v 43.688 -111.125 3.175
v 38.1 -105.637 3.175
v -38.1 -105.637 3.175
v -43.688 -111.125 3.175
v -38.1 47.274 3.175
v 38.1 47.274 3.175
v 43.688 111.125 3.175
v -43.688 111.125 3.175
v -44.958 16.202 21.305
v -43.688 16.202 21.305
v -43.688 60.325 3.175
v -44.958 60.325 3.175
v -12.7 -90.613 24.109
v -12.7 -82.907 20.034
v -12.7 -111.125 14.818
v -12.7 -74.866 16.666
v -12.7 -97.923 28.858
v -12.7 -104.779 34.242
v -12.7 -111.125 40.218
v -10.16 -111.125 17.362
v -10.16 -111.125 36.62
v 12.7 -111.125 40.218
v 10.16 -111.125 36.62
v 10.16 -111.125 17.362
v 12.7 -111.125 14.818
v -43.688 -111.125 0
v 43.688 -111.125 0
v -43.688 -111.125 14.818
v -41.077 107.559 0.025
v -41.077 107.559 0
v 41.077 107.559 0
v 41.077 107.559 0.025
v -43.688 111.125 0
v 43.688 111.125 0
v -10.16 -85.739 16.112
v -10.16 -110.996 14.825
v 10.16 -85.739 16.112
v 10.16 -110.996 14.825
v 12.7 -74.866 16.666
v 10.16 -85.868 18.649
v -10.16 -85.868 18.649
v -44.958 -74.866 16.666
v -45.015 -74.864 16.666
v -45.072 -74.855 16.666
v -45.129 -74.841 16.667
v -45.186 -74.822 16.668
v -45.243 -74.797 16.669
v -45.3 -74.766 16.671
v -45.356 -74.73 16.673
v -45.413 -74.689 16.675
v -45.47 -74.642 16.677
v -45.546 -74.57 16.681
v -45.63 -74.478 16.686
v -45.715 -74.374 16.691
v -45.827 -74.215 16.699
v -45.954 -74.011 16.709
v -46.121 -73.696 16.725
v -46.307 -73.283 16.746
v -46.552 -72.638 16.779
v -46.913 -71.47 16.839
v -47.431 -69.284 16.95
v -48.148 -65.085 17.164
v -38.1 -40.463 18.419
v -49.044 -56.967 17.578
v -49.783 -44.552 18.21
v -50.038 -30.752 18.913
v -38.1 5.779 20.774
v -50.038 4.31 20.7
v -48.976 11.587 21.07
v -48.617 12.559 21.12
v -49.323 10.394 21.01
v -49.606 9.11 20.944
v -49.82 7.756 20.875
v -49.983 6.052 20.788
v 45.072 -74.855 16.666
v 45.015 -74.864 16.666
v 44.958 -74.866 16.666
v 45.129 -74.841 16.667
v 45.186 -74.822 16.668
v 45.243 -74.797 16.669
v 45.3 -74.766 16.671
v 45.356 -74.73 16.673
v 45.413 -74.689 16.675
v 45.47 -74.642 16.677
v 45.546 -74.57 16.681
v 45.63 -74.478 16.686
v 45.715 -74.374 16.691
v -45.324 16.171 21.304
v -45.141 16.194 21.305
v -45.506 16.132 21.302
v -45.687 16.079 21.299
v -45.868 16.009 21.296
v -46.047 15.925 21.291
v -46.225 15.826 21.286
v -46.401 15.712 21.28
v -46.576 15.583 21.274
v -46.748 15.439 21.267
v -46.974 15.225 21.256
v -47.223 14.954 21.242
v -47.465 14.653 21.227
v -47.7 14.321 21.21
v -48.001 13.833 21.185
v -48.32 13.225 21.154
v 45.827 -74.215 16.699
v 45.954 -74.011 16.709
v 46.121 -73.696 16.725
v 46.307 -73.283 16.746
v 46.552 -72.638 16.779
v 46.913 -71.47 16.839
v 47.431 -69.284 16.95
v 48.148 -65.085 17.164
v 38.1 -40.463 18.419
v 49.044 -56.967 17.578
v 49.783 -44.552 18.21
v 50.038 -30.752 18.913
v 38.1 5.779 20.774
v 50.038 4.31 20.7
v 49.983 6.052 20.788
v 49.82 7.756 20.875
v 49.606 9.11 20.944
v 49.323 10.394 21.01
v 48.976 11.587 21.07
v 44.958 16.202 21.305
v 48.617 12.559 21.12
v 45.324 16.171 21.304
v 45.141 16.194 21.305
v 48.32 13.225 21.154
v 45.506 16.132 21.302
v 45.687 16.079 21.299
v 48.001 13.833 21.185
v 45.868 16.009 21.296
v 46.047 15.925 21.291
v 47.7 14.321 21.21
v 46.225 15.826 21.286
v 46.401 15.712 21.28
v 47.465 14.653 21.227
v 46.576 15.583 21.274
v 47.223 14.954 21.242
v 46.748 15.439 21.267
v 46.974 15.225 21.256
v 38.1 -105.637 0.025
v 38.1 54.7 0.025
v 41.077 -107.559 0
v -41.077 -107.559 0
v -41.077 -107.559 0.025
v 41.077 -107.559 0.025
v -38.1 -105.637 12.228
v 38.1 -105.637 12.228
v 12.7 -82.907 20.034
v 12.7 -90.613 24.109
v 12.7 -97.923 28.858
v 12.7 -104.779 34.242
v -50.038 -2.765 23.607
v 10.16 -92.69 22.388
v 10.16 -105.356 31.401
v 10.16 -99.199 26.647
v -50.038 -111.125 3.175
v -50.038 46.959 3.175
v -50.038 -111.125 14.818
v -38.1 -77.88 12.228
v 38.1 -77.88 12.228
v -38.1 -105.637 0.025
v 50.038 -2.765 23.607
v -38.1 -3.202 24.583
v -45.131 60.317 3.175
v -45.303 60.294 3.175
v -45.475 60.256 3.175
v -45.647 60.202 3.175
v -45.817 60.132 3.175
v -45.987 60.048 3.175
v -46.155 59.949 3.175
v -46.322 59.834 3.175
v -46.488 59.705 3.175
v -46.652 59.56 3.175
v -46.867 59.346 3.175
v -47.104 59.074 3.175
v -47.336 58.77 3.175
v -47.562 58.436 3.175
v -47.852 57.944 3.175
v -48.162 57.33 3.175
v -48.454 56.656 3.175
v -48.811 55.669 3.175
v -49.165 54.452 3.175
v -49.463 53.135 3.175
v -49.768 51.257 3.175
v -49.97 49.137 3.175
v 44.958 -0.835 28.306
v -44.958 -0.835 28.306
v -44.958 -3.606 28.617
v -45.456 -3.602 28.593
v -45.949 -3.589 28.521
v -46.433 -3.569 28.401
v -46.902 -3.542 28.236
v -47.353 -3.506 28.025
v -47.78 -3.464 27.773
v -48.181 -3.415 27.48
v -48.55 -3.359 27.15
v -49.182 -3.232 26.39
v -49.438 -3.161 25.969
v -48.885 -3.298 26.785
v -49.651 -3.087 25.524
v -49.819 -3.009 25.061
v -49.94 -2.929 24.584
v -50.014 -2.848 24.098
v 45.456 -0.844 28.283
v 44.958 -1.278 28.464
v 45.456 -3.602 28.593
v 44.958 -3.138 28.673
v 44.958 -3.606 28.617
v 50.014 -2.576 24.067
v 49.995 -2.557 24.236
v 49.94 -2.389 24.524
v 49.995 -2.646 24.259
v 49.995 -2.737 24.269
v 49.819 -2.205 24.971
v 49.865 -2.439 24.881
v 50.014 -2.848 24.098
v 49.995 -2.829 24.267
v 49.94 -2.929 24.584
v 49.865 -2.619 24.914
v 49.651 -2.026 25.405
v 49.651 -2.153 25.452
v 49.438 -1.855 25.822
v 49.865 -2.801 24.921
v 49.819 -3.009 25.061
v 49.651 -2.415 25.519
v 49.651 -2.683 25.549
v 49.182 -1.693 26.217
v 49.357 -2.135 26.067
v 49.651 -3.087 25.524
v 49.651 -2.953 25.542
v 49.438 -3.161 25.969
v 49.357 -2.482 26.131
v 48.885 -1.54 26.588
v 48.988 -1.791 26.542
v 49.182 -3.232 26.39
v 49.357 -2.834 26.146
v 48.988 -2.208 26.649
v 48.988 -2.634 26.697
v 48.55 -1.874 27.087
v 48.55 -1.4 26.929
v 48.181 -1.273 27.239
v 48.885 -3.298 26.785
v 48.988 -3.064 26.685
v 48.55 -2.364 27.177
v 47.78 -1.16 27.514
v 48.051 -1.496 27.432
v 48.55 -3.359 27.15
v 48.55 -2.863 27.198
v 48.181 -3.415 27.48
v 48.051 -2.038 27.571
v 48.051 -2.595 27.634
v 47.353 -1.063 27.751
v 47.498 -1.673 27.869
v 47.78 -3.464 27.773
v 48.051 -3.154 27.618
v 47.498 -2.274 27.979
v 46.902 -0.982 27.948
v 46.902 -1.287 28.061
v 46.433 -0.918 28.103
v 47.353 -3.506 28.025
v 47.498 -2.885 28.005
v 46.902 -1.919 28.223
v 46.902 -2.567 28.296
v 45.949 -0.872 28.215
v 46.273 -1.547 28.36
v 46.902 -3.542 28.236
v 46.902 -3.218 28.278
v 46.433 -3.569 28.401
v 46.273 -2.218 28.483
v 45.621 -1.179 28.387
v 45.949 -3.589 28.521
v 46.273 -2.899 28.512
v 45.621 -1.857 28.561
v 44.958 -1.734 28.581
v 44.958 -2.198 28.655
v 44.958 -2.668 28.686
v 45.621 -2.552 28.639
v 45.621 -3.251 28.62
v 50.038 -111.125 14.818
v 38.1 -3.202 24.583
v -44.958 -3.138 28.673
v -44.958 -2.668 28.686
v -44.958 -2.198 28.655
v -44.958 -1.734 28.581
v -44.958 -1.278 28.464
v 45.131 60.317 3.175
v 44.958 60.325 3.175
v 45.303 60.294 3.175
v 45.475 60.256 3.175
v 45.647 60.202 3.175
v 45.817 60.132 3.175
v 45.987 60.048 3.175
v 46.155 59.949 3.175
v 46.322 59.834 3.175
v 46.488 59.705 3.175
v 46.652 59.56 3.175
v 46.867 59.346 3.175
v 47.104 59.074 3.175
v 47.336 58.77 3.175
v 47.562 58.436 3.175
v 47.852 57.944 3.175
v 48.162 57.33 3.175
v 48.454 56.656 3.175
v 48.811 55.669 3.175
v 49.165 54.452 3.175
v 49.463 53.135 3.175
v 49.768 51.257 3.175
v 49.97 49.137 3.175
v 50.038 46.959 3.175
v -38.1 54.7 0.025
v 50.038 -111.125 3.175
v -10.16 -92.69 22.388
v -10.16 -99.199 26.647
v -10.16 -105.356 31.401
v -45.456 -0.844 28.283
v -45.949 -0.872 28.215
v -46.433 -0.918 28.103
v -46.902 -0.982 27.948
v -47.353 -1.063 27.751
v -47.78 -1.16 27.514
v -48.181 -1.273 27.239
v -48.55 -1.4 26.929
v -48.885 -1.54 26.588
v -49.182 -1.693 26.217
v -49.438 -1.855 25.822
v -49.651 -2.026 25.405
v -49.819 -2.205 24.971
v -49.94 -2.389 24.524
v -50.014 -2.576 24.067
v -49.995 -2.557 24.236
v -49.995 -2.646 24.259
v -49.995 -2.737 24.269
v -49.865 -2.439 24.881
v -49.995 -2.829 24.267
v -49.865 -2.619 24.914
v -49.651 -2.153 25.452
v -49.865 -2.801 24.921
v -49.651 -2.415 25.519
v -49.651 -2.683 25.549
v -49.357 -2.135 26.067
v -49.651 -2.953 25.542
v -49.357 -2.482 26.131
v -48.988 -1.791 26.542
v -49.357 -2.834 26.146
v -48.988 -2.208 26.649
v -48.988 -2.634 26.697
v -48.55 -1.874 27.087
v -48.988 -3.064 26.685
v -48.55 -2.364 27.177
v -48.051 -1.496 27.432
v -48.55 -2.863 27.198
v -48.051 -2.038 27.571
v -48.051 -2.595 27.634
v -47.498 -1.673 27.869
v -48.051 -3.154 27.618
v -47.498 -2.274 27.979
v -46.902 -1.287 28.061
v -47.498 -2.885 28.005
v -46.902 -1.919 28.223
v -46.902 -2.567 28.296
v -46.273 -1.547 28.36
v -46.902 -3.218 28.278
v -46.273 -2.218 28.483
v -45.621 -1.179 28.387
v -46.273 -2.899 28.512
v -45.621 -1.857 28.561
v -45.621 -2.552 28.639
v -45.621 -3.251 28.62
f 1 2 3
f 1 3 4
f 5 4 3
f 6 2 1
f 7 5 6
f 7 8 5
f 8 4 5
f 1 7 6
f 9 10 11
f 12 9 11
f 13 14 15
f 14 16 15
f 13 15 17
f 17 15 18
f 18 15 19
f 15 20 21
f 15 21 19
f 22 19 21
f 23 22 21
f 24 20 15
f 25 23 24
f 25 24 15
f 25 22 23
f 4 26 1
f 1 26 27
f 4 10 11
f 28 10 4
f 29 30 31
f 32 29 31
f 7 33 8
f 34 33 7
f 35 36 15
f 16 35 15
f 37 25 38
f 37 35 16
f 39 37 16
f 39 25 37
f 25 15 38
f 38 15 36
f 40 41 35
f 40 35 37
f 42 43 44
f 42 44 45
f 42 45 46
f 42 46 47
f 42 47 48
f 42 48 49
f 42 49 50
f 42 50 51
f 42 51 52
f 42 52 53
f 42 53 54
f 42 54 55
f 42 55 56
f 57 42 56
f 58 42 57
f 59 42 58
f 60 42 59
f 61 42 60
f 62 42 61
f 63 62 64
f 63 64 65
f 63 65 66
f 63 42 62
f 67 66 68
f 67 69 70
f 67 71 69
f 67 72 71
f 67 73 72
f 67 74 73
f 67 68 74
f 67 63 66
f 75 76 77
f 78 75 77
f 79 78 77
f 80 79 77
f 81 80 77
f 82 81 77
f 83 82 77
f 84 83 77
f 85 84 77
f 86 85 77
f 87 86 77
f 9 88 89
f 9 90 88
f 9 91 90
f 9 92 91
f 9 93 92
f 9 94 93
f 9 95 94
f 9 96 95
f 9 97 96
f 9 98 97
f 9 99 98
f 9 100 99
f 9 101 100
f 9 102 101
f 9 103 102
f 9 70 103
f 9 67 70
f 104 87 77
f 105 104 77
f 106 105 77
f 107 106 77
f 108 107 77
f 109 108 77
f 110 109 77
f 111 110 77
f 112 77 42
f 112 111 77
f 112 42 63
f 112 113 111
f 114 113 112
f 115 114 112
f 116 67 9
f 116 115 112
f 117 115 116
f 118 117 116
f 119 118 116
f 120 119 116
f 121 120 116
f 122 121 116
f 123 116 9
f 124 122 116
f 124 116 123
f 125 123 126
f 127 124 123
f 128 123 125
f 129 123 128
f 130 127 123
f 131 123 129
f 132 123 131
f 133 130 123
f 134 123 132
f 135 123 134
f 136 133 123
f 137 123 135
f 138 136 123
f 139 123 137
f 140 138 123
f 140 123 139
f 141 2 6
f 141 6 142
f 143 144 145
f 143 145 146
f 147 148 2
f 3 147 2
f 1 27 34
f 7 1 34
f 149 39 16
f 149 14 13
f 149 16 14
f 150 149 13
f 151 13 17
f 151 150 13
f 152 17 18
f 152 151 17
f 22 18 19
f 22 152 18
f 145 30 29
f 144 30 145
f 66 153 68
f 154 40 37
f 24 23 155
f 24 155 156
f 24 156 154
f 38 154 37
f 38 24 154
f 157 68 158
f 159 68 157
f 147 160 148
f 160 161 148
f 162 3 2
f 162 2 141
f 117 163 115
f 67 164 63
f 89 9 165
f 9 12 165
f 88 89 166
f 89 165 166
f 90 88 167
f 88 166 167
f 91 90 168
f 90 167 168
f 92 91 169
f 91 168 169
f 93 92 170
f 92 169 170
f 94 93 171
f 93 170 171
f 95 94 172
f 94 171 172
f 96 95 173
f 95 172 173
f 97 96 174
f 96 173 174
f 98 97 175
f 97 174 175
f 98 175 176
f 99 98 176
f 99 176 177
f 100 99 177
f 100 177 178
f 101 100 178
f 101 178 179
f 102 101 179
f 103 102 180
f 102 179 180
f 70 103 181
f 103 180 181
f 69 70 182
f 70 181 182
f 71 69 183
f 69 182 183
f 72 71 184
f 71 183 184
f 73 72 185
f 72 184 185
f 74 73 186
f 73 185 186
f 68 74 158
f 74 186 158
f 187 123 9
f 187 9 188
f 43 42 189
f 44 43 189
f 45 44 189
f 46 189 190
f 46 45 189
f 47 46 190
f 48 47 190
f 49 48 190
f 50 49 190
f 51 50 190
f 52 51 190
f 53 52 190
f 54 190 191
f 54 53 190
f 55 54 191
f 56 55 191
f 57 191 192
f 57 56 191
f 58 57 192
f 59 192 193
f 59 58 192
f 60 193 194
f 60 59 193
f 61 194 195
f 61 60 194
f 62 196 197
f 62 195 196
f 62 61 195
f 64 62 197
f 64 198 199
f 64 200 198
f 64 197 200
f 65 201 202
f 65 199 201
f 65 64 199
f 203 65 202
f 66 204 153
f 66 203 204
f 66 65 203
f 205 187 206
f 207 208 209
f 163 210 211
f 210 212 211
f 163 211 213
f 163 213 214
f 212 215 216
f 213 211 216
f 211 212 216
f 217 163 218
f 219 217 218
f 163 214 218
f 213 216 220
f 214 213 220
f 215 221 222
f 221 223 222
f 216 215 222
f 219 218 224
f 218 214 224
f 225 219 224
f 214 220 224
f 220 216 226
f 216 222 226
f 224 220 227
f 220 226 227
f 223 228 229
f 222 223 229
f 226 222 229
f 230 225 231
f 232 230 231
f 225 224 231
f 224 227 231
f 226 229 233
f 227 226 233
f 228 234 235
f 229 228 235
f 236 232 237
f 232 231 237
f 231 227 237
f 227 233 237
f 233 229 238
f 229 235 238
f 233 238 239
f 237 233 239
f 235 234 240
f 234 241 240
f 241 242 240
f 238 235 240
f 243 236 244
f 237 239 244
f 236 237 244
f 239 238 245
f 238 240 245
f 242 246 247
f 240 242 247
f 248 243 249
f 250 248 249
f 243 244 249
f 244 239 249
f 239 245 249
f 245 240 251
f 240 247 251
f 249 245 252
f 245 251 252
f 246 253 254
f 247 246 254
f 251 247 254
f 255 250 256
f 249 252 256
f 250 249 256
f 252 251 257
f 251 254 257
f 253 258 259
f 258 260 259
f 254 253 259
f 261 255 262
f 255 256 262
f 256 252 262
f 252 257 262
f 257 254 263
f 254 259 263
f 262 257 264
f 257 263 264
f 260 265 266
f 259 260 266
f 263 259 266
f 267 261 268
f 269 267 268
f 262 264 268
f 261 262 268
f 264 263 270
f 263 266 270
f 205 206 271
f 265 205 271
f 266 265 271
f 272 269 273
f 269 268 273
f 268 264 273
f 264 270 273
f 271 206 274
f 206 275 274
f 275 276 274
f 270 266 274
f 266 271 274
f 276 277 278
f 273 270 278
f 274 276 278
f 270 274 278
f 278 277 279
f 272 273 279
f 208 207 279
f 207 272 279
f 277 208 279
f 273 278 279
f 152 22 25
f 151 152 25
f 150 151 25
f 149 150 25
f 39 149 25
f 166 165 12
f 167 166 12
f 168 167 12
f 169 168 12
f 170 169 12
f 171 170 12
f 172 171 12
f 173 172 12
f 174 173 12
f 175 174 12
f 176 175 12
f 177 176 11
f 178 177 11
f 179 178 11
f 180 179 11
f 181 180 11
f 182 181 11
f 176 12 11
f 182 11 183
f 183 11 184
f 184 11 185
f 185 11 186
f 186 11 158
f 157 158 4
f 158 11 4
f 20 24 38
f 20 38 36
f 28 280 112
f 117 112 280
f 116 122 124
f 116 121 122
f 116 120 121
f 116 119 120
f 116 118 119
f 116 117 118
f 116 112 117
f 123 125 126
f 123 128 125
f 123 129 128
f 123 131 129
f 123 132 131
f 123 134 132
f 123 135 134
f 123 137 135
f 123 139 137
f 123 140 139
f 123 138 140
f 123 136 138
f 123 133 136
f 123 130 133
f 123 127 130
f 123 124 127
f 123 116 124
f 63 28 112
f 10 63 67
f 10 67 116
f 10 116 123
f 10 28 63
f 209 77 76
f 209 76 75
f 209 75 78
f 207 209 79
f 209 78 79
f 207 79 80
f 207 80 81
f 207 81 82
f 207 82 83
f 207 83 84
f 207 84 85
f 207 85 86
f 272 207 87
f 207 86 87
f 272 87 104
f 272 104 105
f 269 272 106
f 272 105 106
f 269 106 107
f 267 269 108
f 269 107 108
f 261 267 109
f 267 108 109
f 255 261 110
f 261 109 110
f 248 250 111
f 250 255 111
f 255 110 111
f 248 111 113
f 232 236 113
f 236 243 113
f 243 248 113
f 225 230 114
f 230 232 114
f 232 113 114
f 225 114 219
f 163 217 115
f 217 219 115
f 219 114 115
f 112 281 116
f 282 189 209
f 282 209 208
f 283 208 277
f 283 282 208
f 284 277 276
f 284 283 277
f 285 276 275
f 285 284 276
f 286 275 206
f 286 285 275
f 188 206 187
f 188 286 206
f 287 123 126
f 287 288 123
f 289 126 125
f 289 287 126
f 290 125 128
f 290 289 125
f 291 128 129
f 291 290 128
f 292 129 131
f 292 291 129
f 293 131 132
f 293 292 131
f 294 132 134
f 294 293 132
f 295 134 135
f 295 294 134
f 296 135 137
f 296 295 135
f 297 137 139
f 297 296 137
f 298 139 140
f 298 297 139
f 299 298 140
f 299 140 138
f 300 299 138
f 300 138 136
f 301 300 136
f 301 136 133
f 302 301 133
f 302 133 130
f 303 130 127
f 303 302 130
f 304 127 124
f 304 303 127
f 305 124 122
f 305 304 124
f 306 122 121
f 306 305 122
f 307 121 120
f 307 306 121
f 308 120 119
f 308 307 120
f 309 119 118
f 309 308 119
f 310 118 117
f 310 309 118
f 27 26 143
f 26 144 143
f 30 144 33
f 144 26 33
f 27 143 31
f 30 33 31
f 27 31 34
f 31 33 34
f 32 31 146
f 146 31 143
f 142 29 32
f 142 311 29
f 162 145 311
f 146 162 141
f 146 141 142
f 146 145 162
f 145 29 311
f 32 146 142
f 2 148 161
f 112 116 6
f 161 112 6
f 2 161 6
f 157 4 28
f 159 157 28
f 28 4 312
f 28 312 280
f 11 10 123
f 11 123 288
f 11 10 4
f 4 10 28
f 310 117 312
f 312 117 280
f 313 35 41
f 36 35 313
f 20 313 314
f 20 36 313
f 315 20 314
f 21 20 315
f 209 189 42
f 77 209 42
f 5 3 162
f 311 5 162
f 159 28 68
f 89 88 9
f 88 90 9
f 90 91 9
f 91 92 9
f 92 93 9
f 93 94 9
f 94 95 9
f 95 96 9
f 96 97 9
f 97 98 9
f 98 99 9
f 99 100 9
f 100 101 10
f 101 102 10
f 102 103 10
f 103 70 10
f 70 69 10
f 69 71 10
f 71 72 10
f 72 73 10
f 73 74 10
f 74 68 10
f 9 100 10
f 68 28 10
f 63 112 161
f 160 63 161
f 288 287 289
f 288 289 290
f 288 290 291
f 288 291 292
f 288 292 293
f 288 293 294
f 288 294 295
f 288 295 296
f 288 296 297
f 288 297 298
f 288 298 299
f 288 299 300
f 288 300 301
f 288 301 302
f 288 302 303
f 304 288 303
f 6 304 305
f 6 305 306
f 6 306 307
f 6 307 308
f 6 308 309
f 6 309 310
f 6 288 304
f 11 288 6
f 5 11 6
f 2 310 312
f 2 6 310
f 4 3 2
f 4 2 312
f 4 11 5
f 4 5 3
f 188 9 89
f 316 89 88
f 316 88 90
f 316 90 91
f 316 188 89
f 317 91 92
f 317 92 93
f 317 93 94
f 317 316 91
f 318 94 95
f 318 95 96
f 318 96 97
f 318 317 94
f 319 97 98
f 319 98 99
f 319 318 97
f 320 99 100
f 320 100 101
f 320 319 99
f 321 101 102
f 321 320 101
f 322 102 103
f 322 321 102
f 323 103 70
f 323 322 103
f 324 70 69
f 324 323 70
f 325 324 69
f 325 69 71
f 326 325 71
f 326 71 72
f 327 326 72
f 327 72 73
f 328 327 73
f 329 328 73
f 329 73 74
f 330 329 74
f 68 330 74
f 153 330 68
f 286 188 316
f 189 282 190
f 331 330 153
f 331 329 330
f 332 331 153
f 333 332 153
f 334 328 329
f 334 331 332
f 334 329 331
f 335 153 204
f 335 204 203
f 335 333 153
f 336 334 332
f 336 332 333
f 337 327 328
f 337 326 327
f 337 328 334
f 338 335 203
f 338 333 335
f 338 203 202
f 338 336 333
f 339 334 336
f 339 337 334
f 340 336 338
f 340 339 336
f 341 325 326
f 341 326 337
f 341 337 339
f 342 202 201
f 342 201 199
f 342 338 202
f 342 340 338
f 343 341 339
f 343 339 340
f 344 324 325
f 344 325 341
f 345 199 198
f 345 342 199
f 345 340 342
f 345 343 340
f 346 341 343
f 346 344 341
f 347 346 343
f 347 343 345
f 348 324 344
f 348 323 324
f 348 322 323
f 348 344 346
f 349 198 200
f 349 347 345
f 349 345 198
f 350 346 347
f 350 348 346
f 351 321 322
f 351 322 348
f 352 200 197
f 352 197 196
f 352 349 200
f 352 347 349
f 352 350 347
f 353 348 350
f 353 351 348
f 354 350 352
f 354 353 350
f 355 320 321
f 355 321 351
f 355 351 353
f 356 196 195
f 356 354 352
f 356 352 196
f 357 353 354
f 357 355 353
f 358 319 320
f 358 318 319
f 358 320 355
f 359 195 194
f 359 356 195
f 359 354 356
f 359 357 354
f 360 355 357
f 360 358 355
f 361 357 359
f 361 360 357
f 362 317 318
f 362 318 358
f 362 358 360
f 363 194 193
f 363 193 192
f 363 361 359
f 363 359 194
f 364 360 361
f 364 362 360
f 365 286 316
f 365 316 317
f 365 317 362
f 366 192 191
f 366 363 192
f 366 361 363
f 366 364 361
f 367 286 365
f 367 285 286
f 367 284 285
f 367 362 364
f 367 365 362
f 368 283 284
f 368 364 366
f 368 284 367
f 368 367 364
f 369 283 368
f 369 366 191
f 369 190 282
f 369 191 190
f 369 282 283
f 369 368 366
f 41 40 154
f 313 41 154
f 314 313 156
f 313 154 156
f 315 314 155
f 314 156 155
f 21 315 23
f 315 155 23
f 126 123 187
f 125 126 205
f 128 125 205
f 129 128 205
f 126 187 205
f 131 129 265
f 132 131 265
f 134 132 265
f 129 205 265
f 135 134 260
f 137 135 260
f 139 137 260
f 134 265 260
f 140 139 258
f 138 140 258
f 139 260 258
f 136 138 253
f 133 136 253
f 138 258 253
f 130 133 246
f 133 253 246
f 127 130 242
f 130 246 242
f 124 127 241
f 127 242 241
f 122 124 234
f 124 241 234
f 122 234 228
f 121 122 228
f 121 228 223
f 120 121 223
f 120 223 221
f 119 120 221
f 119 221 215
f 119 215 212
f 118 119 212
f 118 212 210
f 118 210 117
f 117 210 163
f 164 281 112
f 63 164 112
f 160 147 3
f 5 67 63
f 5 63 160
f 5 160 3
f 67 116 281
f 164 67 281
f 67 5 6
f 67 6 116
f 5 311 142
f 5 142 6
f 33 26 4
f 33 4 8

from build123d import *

# Parameters (mm, degrees)
F0_W      = 87.376
F0_H      = 222.25
F1_DEPTH  = 3.175
F3_DEPTH  = 6.35
F4_DEPTH  = 87.376
F5_DEPTH  = 6.35
F7_DEPTH  = 100.076
F8_W      = 37.338
F8_H      = 25.4
F9_DEPTH  = 38.1
F10_W     = 82.1538120508
F10_H     = 215.1187956333
F11_DEPTH = 0.0254
F13_DEPTH = 38.1
F14_T     = -2.54
F15_DEPTH = 25.4
F16_R     = 5.08
F16_2_R   = 5.08
F16_3_R   = 5.08


# Not quite as in the source:
# - a feature names something its author has since deleted; it is built from what else it names


with BuildPart() as f1:
    # F0 (on Top) → F1 (new body)
    with BuildSketch(Plane.XY):
        Rectangle(F0_W, F0_H)
    extrude(amount=F1_DEPTH)

    # F10 (on face) → F11 (cut)
    with BuildSketch(Plane(origin=(0, 0, 0), x_dir=(1, 0, 0), z_dir=(0, 0, -1))):
        Rectangle(F10_W, F10_H)
    extrude(amount=-F11_DEPTH, mode=Mode.SUBTRACT)


with BuildPart() as f3:
    # F2 (on face) → F3 (new body)
    with BuildSketch(Plane(origin=(-43.688, 0, 0), x_dir=(0, -1, 0), z_dir=(-1, 0, 0))):
        Polygon((-16.2016954273, 21.3054399937), (-60.325, 3.175), (111.125, 3.175), (111.125, 14.8184783757), align=None)
    extrude(amount=F3_DEPTH)


with BuildPart() as f4:
    # F4 (new): a face of the model
    f4_faces = [f3.part.faces().sort_by_distance(p)[0] for p in [
        (-43.688, -29.9876869661, 10.4717867794),
    ]]
    extrude(f4_faces, amount=F4_DEPTH)

    # F5 (add): a face of the model
    f5_faces = [f4.faces().sort_by_distance(p)[0] for p in [
        (43.688, -29.9876869661, 10.4717867794),
    ]]
    extrude(f5_faces, amount=F5_DEPTH)


with BuildPart() as f7:
    # F6 (on face) → F7 (new body)
    with BuildSketch(Plane.YZ.offset(50.038)):
        with BuildLine():
            Line((-111.125, 40.2184783757), (-111.125, 14.8184783757))
            Line((-111.125, 14.8184783757), (-74.8663830833, 16.6657599334))
            ThreePointArc((-74.8663830833, 16.6657599334), (-94.3214065955, 26.4012254718), (-111.125, 40.2184783757))
        make_face()
    extrude(amount=-F7_DEPTH)

    # F8 (on face) → F9 (cut)
    with BuildSketch(Plane.XZ.offset(111.125)):
        Polygon((-50.038, 14.8184783757), (-50.038, 40.2184783757), (-12.7, 40.2184783757), (-12.7, 47.7892234921), (-50.038, 45.227330178), (-81.4004353094, 16.6523270309), align=None)
        with Locations((-31.369, 27.5184783757)):
            Rectangle(F8_W, F8_H)
        Polygon((12.7, 47.7892234921), (12.7, 40.2184783757), (50.038, 40.2184783757), (50.038, 14.8184783757), (75.860601027, 14.8184783757), (72.0834517309, 16.6523270309), (65.1312917471, 48.7745702267), (40.7210164215, 45.227330178), align=None)
        Polygon((50.038, 40.2184783757), (12.7, 40.2184783757), (12.7, 14.8184783757), (46.51265473, 14.8184783757), (50.038, 14.8184783757), align=None)
    extrude(amount=-F9_DEPTH, mode=Mode.SUBTRACT)

    # F14
    f14_openings = [f7.faces().sort_by_distance(p)[0] for p in [
        (0, -111.125, 27.518478),
    ]]
    offset(amount=F14_T, openings=f14_openings)

    # F15 (cut): a face of the model
    f15_faces = [f7.faces().sort_by_distance(p)[0] for p in [
        (0, -98.4966020741, 18.0051564926),
    ]]
    extrude(f15_faces, amount=-F15_DEPTH, mode=Mode.SUBTRACT)


with BuildPart() as f7b:
    # F6 (on face) → F7, piece 2 (new body)
    with BuildSketch(Plane.YZ.offset(50.038)):
        Polygon((-2.1756697122, 28.8567718609), (-74.8663830833, 16.6657599334), (16.2016954273, 21.3054399937), align=None)
    extrude(amount=-F7_DEPTH)


with BuildPart() as f13_tool:
    # F12 (on Right) → F13 (new body, symmetric)
    with BuildSketch(Plane.YZ):
        Polygon((-105.6373342872, 0), (54.759632796, 0), (-3.2019854989, 24.5833210647), (-77.8798013926, 12.2278658673), (-105.6373342872, 12.2278658673), align=None)
    extrude(amount=F13_DEPTH, both=True)


with BuildPart() as f1_1:
    add(f1.part)

    # F13: cut by f13_tool
    add(f13_tool.part, mode=Mode.SUBTRACT)


with BuildPart() as f4_1:
    add(f4.part)

    # F13: cut by f13_tool
    add(f13_tool.part, mode=Mode.SUBTRACT)

    # F16#2
    f16_2_edges = [f4_1.edges().sort_by_distance(p)[0] for p in [
        (50.038, 38.263348, 12.24022),
    ]]
    fillet(f16_2_edges, radius=F16_2_R)


with BuildPart() as f7b_1:
    add(f7b.part)

    # F13: cut by f13_tool
    add(f13_tool.part, mode=Mode.SUBTRACT)

    # F16#3
    f16_3_edges = [f7b_1.edges().sort_by_distance(p)[0] for p in [
        (-50.038, 7.013013, 25.081106),
        (-50.038, -38.521026, 22.761266),
        (50.038, 7.013013, 25.081106),
        (50.038, -38.521026, 22.761266),
        (0, -2.17567, 28.856772),
    ]]
    fillet(f16_3_edges, radius=F16_3_R)


with BuildPart() as f3_1:
    add(f3.part)

    # F16
    f16_edges = [f3_1.edges().sort_by_distance(p)[0] for p in [
        (-50.038, 38.263348, 12.24022),
    ]]
    fillet(f16_edges, radius=F16_R)


solid = Compound([f7.part, f1_1.part, f4_1.part, f7b_1.part, f3_1.part])
